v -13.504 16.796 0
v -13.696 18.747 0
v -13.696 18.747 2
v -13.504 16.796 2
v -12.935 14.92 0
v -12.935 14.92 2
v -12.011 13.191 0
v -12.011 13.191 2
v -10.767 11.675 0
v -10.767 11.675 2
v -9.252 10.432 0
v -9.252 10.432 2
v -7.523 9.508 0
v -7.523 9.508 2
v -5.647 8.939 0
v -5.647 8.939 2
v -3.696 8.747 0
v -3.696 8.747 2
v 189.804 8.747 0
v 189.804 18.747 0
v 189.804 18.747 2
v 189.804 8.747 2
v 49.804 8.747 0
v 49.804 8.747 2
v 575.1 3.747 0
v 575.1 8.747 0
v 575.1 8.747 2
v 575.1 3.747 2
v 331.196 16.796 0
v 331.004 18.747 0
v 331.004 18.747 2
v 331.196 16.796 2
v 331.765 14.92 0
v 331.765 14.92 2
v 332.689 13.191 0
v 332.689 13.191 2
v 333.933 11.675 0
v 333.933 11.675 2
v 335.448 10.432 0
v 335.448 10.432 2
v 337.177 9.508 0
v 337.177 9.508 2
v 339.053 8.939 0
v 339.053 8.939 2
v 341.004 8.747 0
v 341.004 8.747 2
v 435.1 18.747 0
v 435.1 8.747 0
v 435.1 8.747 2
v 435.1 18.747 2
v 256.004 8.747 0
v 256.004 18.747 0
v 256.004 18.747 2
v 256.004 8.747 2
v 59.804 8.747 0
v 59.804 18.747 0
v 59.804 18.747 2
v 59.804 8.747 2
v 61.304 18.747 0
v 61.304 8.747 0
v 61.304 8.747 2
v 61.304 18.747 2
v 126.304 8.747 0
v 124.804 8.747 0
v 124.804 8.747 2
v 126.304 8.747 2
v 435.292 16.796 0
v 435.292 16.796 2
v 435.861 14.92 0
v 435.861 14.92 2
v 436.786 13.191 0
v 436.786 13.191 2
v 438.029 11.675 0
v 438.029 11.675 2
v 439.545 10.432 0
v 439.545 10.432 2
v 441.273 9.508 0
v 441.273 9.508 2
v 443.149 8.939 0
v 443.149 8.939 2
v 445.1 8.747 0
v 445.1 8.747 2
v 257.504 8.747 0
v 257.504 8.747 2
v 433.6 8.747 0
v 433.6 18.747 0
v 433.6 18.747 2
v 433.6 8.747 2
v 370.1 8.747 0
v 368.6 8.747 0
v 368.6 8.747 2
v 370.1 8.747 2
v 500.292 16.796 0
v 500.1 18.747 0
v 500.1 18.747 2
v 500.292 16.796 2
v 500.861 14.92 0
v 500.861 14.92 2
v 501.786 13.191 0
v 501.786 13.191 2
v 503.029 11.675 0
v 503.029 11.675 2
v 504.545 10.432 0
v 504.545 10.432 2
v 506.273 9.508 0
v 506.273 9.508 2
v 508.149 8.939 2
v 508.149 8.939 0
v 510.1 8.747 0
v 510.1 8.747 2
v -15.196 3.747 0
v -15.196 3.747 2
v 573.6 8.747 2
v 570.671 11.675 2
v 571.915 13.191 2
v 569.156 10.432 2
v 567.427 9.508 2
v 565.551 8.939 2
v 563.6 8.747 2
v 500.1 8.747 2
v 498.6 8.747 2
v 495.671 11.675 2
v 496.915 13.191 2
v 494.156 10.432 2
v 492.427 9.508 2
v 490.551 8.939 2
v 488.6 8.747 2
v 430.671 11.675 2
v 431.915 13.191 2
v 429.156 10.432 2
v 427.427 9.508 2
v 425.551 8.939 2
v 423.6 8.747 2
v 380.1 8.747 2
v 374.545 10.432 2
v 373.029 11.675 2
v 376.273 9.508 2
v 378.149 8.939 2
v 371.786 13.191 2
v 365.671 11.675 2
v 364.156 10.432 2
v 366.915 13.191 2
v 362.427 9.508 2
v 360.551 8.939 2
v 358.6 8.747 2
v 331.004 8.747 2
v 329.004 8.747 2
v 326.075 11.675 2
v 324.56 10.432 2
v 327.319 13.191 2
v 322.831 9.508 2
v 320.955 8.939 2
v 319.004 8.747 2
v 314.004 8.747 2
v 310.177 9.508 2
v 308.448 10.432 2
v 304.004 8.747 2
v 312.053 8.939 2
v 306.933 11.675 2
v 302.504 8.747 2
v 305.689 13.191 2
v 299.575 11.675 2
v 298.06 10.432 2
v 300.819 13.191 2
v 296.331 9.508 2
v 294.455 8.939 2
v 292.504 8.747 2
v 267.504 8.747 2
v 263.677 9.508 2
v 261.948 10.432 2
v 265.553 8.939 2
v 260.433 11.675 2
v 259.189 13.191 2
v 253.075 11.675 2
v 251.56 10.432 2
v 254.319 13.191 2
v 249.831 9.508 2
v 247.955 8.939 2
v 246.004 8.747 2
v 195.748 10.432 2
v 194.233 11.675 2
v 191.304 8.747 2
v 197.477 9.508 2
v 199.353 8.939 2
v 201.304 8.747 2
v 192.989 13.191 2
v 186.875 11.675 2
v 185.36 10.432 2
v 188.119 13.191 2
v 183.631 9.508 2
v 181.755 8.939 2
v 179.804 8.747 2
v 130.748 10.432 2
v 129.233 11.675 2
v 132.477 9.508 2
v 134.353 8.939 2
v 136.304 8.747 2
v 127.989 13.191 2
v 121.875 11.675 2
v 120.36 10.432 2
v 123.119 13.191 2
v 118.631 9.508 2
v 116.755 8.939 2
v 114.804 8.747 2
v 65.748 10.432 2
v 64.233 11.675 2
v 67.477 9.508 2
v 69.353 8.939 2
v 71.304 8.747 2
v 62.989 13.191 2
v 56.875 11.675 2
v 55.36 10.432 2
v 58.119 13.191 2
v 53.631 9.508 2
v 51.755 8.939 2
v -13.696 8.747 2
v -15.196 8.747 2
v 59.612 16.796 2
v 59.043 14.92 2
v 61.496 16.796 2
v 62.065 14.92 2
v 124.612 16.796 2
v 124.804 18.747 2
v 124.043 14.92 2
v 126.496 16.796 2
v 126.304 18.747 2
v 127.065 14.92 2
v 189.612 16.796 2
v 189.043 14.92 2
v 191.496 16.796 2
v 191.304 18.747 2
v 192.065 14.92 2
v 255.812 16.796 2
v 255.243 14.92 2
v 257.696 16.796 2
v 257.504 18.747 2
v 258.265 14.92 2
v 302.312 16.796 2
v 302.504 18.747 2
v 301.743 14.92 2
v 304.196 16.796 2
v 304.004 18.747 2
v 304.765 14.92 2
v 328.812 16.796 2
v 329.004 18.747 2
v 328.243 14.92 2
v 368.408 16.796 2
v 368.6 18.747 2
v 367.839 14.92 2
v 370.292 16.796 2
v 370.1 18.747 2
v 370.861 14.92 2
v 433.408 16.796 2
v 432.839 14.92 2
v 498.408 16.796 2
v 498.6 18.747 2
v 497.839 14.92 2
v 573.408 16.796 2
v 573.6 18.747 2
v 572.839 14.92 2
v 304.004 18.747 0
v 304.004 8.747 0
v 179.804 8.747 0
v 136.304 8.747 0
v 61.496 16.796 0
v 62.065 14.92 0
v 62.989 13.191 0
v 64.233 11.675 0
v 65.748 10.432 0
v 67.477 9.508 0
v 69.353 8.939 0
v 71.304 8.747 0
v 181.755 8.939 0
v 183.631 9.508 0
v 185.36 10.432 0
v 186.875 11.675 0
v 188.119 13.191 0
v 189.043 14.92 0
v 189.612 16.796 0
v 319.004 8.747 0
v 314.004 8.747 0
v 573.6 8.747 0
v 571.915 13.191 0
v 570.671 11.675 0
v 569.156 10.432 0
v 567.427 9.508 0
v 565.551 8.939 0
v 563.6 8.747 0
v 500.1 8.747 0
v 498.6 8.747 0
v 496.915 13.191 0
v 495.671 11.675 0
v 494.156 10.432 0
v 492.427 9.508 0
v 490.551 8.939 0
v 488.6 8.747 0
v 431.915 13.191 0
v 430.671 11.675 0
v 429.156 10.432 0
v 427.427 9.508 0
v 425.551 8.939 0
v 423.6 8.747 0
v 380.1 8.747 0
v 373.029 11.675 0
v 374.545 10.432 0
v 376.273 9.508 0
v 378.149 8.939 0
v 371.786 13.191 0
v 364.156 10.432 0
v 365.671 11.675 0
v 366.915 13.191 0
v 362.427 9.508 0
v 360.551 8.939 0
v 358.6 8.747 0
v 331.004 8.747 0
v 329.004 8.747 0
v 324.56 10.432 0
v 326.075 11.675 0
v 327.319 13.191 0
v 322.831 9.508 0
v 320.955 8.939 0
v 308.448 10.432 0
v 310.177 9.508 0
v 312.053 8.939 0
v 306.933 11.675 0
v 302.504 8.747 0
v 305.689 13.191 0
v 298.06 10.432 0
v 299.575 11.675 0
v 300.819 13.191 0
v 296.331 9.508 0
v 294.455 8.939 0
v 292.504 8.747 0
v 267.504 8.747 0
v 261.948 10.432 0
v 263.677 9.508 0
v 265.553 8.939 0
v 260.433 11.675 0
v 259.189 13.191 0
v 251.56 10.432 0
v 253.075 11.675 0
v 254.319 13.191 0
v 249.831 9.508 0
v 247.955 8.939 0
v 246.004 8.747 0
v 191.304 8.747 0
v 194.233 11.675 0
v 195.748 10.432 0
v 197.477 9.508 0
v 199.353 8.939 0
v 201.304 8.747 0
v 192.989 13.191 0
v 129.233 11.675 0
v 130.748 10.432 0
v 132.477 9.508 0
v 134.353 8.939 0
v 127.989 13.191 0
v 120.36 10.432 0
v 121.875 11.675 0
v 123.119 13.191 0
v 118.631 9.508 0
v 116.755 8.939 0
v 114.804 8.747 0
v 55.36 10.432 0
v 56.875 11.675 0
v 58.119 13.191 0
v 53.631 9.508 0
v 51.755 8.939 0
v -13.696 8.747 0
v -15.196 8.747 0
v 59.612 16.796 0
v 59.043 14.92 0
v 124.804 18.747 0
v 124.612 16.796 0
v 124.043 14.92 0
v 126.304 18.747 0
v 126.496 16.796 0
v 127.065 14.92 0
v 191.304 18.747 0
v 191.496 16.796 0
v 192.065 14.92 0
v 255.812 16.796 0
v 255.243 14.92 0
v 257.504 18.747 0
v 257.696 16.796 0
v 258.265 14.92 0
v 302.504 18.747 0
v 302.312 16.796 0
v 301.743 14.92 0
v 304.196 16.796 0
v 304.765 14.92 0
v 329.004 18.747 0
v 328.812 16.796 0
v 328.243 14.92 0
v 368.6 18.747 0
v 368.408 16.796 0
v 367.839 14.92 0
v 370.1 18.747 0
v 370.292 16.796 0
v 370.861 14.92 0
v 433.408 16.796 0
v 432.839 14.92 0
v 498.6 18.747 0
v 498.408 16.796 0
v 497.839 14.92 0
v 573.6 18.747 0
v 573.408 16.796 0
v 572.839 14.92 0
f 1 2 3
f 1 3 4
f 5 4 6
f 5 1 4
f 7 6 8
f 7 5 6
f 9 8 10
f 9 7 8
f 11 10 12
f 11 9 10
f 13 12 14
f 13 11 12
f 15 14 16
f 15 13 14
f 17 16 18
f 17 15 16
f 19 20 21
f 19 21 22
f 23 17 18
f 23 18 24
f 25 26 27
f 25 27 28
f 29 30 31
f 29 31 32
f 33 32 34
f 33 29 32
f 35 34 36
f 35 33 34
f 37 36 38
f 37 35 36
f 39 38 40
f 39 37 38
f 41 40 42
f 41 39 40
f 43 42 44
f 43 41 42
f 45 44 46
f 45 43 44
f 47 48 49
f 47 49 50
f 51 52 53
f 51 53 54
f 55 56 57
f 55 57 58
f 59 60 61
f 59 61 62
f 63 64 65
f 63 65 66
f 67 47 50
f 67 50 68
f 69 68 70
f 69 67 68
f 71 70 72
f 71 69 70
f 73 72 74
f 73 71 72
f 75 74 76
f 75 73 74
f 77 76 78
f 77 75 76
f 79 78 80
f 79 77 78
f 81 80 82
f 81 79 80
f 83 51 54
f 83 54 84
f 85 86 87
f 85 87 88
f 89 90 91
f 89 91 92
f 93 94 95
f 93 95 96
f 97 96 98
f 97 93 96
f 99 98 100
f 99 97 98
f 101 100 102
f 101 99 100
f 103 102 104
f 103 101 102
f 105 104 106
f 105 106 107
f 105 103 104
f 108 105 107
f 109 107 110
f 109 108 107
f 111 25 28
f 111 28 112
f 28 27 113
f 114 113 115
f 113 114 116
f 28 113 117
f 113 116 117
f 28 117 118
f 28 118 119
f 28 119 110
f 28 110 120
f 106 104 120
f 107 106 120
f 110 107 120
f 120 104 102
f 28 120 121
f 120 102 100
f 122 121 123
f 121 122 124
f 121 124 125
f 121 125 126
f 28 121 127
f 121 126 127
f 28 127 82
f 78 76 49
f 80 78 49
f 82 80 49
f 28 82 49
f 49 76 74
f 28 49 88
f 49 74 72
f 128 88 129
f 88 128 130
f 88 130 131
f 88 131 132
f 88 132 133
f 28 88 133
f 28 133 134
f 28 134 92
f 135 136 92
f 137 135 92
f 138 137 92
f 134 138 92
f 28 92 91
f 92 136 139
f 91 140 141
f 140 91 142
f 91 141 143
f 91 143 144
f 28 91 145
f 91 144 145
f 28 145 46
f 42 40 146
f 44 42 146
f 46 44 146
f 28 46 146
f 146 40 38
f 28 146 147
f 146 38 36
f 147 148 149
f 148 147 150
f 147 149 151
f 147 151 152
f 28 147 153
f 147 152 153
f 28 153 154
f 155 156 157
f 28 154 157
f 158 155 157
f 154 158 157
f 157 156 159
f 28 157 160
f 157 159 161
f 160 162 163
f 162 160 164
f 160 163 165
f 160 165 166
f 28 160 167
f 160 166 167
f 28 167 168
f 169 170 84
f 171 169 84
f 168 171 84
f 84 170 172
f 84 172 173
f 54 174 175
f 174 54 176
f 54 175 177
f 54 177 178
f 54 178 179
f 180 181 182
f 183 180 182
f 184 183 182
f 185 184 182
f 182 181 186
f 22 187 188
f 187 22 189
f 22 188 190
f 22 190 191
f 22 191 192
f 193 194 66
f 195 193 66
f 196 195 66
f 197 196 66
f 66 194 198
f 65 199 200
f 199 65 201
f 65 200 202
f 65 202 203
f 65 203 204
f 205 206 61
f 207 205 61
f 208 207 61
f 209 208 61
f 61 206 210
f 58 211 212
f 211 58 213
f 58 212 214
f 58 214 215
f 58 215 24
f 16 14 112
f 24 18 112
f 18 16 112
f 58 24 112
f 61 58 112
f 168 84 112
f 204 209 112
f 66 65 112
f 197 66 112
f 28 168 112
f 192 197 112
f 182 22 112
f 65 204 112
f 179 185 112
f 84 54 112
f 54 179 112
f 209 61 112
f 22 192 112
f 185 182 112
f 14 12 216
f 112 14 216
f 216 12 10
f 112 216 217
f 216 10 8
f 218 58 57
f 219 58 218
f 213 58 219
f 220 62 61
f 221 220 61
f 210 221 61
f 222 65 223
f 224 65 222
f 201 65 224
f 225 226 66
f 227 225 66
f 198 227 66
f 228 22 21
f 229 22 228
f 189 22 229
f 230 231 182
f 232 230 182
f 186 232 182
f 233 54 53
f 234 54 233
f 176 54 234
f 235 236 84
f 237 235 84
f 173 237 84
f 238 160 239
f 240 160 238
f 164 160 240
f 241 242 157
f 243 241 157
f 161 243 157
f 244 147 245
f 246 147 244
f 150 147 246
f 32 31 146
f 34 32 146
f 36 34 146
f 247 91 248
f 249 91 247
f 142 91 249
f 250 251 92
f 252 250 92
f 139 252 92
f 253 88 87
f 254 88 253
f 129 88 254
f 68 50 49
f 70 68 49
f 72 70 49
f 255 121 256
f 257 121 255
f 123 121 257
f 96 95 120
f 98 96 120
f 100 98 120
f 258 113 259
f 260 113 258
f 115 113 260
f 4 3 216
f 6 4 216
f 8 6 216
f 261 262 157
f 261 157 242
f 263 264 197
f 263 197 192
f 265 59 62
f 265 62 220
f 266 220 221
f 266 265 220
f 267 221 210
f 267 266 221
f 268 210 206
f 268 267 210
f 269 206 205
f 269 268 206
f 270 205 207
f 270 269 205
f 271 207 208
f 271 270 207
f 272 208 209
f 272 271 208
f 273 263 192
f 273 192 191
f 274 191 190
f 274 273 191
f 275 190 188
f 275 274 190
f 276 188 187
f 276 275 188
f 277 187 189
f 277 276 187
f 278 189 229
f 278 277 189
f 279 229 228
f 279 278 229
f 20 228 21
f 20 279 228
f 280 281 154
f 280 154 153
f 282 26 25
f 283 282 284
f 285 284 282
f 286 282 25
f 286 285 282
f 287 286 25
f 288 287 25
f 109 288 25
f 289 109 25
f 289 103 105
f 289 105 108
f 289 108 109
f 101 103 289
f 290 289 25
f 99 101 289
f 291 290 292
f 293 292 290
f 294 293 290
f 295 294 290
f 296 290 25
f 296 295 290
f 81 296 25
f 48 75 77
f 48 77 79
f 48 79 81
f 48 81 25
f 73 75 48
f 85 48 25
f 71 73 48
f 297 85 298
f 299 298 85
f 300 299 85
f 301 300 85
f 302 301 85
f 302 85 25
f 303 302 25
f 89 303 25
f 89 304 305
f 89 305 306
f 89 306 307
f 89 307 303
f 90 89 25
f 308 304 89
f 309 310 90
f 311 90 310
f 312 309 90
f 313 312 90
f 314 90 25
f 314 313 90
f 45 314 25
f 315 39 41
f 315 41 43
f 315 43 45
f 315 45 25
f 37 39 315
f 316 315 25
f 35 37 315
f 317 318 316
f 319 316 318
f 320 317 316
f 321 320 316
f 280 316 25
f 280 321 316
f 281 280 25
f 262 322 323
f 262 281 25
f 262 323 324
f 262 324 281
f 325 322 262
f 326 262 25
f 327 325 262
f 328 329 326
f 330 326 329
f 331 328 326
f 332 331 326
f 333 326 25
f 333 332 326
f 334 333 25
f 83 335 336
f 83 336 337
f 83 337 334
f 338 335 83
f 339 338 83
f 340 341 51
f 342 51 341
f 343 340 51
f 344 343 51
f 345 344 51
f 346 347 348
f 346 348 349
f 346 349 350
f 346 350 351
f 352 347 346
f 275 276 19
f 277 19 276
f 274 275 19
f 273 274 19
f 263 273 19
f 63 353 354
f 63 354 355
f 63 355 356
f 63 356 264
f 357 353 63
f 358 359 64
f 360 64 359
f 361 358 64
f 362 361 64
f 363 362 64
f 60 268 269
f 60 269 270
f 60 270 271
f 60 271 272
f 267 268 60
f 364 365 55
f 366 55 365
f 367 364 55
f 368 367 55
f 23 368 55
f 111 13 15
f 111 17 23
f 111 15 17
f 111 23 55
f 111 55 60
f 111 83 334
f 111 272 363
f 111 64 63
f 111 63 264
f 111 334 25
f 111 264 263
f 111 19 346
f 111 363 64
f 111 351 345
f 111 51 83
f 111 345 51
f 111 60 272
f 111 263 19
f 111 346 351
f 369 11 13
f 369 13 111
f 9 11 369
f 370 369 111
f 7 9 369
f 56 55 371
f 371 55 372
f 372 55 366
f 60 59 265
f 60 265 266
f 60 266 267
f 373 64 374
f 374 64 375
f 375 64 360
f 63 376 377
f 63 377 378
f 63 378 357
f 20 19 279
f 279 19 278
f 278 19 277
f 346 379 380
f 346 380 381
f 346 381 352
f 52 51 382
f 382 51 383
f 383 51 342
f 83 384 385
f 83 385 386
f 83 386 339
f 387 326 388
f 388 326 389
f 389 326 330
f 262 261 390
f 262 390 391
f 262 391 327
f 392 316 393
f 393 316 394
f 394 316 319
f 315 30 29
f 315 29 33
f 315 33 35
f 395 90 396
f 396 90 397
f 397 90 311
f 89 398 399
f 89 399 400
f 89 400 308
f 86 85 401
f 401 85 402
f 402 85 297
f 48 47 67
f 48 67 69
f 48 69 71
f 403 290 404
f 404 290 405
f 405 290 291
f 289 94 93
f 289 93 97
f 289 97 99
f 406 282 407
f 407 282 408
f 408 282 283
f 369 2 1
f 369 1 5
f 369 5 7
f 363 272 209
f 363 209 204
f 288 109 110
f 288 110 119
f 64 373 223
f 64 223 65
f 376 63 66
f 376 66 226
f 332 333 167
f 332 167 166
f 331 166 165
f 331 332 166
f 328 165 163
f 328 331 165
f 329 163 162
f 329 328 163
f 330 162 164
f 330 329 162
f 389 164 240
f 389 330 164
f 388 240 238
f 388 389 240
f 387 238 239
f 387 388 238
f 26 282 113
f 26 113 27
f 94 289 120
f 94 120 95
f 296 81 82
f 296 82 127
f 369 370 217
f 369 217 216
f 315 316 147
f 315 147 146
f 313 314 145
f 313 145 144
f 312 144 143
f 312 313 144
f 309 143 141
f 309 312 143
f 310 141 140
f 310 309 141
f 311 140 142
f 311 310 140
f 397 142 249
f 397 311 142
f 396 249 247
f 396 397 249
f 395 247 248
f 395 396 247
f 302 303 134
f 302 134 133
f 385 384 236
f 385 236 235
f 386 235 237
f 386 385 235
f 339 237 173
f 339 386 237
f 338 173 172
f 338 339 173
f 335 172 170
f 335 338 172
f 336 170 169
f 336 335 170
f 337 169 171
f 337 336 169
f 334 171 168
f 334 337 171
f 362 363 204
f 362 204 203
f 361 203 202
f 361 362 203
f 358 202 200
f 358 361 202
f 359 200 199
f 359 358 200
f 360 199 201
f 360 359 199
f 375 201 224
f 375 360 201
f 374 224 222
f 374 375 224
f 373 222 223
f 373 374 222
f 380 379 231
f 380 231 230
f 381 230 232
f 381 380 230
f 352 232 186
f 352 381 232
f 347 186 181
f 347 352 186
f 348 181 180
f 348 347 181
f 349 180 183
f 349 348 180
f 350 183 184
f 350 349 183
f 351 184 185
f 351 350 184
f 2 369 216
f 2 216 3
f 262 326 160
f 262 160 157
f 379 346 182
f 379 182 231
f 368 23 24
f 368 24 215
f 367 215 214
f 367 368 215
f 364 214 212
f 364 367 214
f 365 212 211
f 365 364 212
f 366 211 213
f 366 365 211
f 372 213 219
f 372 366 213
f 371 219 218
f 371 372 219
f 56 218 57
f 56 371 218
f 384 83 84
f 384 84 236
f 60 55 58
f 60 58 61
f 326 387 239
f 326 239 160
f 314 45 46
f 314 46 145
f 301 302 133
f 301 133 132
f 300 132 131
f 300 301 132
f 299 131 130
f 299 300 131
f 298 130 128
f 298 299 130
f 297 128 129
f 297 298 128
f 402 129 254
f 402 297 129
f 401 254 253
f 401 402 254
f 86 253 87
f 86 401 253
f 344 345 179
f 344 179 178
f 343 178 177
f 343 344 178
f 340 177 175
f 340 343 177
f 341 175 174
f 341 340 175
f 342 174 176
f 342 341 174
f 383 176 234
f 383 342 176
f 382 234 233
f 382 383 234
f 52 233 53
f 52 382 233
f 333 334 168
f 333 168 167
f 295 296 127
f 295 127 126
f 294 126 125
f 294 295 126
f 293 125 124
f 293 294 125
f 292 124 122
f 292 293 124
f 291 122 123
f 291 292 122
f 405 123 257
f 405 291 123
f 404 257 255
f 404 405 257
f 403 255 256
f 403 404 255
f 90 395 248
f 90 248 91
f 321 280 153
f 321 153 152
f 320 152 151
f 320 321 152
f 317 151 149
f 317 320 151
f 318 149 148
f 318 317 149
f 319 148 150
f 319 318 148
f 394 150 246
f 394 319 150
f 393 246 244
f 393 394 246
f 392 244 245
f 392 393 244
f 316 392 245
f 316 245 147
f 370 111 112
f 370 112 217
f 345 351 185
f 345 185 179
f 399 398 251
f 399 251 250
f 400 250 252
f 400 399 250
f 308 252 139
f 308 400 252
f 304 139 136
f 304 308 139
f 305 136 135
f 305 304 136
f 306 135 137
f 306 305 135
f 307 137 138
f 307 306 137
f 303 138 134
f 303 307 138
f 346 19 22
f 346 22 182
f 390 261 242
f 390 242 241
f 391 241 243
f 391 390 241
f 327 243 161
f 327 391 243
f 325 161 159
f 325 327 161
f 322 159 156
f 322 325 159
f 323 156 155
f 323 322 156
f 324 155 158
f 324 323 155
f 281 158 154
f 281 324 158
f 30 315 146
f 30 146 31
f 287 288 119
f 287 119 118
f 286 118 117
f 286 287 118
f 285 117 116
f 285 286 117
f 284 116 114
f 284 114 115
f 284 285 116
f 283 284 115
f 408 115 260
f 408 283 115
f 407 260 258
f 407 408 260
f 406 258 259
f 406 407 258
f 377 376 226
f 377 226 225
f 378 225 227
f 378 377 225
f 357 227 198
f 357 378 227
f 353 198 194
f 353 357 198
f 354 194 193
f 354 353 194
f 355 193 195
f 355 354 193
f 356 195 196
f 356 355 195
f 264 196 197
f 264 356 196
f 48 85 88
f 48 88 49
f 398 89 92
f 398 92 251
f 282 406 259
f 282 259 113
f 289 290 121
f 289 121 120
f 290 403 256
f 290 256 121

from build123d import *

# Parameters (mm, degrees)
EXTRUDE_1_DEPTH = 2


with BuildPart() as part:
    # Model → 凸台-拉伸1 (new body)
    with BuildSketch(Plane.XY):
        with BuildLine():
            Line((-3.696013755, 8.746558964), (49.803963076, 8.746558964))
            ThreePointArc((49.803963076, 8.746558964), (56.875030888, 11.675491152), (59.803963076, 18.746558964))
            Line((59.803963076, 18.746558964), (59.803963076, 8.746558964))
            Line((59.803963076, 8.746558964), (61.303963076, 8.746558964))
            Line((61.303963076, 8.746558964), (61.303963076, 18.746558964))
            ThreePointArc((61.303963076, 18.746558964), (64.232895264, 11.675491152), (71.303963076, 8.746558964))
            Line((71.303963076, 8.746558964), (114.803939907, 8.746558964))
            ThreePointArc((114.803939907, 8.746558964), (121.875007719, 11.675491152), (124.803939907, 18.746558964))
            Line((124.803939907, 18.746558964), (124.803939907, 8.746558964))
            Line((124.803939907, 8.746558964), (126.303939907, 8.746558964))
            Line((126.303939907, 8.746558964), (126.303939907, 18.746558964))
            ThreePointArc((126.303939907, 18.746558964), (129.232872095, 11.675491152), (136.303939907, 8.746558964))
            Line((136.303939907, 8.746558964), (179.803916738, 8.746558964))
            ThreePointArc((179.803916738, 8.746558964), (186.87498455, 11.675491152), (189.803916738, 18.746558964))
            Line((189.803916738, 18.746558964), (189.803916738, 8.746558964))
            Line((189.803916738, 8.746558964), (191.303916738, 8.746558964))
            Line((191.303916738, 8.746558964), (191.303916738, 18.746558964))
            ThreePointArc((191.303916738, 18.746558964), (194.232848927, 11.675491152), (201.303916739, 8.746558964))
            Line((201.303916739, 8.746558964), (246.003891639, 8.746558964))
            ThreePointArc((246.003891639, 8.746558964), (253.07495945, 11.675491152), (256.003891639, 18.746558964))
            Line((256.003891639, 18.746558964), (256.003891639, 8.746558964))
            Line((256.003891639, 8.746558964), (257.503891639, 8.746558964))
            Line((257.503891639, 8.746558964), (257.503891639, 18.746558964))
            ThreePointArc((257.503891639, 18.746558964), (260.432823827, 11.675491152), (267.503891639, 8.746558964))
            Line((267.503891639, 8.746558964), (275.474891639, 8.746558964))
            Line((275.474891639, 8.746558964), (292.503901751, 8.746558964))
            ThreePointArc((292.503901751, 8.746558964), (299.574969563, 11.675491152), (302.503901751, 18.746558964))
            Line((302.503901751, 18.746558964), (302.503901751, 8.746558964))
            Line((302.503901751, 8.746558964), (304.003901751, 8.746558964))
            Line((304.003901751, 8.746558964), (304.003901751, 18.746558964))
            ThreePointArc((304.003901751, 18.746558964), (306.932833939, 11.675491152), (314.003901751, 8.746558964))
            Line((314.003901751, 8.746558964), (319.003901751, 8.746558964))
            ThreePointArc((319.003901751, 8.746558964), (326.074969563, 11.675491152), (329.003901751, 18.746558964))
            Line((329.003901751, 18.746558964), (329.003901751, 8.746558964))
            Line((329.003901751, 8.746558964), (331.003901751, 8.746558964))
            Line((331.003901751, 8.746558964), (331.003901751, 18.746558964))
            ThreePointArc((331.003901751, 18.746558964), (333.932833939, 11.675491152), (341.003901751, 8.746558964))
            Line((341.003901751, 8.746558964), (358.600293959, 8.746558964))
            ThreePointArc((358.600293959, 8.746558964), (365.671361771, 11.675491152), (368.600293959, 18.746558964))
            Line((368.600293959, 18.746558964), (368.600293959, 8.746558964))
            Line((368.600293959, 8.746558964), (370.100293959, 8.746558964))
            Line((370.100293959, 8.746558964), (370.100293959, 18.746558964))
            ThreePointArc((370.100293959, 18.746558964), (373.029226147, 11.675491152), (380.10029396, 8.746558964))
            Line((380.10029396, 8.746558964), (423.600270791, 8.746558964))
            ThreePointArc((423.600270791, 8.746558964), (430.671338603, 11.675491152), (433.600270791, 18.746558964))
            Line((433.600270791, 18.746558964), (433.600270791, 8.746558964))
            Line((433.600270791, 8.746558964), (435.100270791, 8.746558964))
            Line((435.100270791, 8.746558964), (435.100270791, 18.746558964))
            ThreePointArc((435.100270791, 18.746558964), (438.029202979, 11.675491152), (445.100270791, 8.746558964))
            Line((445.100270791, 8.746558964), (488.600247622, 8.746558964))
            ThreePointArc((488.600247622, 8.746558964), (495.671315434, 11.675491152), (498.600247622, 18.746558964))
            Line((498.600247622, 18.746558964), (498.600247622, 8.746558964))
            Line((498.600247622, 8.746558964), (500.100247622, 8.746558964))
            Line((500.100247622, 8.746558964), (500.100247622, 18.746558964))
            ThreePointArc((500.100247622, 18.746558964), (503.02917981, 11.675491152), (510.100247622, 8.746558964))
            Line((510.100247622, 8.746558964), (563.600224453, 8.746558964))
            ThreePointArc((563.600224453, 8.746558964), (570.671292265, 11.675491152), (573.600224453, 18.746558964))
            Line((573.600224453, 18.746558964), (573.600224453, 8.746558964))
            Line((573.600224453, 8.746558964), (575.100224453, 8.746558964))
            Line((575.100224453, 8.746558964), (575.100224453, 3.746558964))
            Line((575.100224453, 3.746558964), (-15.196013755, 3.746558964))
            Line((-15.196013755, 3.746558964), (-15.196013755, 8.746558964))
            Line((-15.196013755, 8.746558964), (-13.696013755, 8.746558964))
            Line((-13.696013755, 8.746558964), (-13.696013755, 18.746558964))
            ThreePointArc((-13.696013755, 18.746558964), (-10.767081567, 11.675491152), (-3.696013755, 8.746558964))
        make_face()
    extrude(amount=EXTRUDE_1_DEPTH)


solid = part.part
